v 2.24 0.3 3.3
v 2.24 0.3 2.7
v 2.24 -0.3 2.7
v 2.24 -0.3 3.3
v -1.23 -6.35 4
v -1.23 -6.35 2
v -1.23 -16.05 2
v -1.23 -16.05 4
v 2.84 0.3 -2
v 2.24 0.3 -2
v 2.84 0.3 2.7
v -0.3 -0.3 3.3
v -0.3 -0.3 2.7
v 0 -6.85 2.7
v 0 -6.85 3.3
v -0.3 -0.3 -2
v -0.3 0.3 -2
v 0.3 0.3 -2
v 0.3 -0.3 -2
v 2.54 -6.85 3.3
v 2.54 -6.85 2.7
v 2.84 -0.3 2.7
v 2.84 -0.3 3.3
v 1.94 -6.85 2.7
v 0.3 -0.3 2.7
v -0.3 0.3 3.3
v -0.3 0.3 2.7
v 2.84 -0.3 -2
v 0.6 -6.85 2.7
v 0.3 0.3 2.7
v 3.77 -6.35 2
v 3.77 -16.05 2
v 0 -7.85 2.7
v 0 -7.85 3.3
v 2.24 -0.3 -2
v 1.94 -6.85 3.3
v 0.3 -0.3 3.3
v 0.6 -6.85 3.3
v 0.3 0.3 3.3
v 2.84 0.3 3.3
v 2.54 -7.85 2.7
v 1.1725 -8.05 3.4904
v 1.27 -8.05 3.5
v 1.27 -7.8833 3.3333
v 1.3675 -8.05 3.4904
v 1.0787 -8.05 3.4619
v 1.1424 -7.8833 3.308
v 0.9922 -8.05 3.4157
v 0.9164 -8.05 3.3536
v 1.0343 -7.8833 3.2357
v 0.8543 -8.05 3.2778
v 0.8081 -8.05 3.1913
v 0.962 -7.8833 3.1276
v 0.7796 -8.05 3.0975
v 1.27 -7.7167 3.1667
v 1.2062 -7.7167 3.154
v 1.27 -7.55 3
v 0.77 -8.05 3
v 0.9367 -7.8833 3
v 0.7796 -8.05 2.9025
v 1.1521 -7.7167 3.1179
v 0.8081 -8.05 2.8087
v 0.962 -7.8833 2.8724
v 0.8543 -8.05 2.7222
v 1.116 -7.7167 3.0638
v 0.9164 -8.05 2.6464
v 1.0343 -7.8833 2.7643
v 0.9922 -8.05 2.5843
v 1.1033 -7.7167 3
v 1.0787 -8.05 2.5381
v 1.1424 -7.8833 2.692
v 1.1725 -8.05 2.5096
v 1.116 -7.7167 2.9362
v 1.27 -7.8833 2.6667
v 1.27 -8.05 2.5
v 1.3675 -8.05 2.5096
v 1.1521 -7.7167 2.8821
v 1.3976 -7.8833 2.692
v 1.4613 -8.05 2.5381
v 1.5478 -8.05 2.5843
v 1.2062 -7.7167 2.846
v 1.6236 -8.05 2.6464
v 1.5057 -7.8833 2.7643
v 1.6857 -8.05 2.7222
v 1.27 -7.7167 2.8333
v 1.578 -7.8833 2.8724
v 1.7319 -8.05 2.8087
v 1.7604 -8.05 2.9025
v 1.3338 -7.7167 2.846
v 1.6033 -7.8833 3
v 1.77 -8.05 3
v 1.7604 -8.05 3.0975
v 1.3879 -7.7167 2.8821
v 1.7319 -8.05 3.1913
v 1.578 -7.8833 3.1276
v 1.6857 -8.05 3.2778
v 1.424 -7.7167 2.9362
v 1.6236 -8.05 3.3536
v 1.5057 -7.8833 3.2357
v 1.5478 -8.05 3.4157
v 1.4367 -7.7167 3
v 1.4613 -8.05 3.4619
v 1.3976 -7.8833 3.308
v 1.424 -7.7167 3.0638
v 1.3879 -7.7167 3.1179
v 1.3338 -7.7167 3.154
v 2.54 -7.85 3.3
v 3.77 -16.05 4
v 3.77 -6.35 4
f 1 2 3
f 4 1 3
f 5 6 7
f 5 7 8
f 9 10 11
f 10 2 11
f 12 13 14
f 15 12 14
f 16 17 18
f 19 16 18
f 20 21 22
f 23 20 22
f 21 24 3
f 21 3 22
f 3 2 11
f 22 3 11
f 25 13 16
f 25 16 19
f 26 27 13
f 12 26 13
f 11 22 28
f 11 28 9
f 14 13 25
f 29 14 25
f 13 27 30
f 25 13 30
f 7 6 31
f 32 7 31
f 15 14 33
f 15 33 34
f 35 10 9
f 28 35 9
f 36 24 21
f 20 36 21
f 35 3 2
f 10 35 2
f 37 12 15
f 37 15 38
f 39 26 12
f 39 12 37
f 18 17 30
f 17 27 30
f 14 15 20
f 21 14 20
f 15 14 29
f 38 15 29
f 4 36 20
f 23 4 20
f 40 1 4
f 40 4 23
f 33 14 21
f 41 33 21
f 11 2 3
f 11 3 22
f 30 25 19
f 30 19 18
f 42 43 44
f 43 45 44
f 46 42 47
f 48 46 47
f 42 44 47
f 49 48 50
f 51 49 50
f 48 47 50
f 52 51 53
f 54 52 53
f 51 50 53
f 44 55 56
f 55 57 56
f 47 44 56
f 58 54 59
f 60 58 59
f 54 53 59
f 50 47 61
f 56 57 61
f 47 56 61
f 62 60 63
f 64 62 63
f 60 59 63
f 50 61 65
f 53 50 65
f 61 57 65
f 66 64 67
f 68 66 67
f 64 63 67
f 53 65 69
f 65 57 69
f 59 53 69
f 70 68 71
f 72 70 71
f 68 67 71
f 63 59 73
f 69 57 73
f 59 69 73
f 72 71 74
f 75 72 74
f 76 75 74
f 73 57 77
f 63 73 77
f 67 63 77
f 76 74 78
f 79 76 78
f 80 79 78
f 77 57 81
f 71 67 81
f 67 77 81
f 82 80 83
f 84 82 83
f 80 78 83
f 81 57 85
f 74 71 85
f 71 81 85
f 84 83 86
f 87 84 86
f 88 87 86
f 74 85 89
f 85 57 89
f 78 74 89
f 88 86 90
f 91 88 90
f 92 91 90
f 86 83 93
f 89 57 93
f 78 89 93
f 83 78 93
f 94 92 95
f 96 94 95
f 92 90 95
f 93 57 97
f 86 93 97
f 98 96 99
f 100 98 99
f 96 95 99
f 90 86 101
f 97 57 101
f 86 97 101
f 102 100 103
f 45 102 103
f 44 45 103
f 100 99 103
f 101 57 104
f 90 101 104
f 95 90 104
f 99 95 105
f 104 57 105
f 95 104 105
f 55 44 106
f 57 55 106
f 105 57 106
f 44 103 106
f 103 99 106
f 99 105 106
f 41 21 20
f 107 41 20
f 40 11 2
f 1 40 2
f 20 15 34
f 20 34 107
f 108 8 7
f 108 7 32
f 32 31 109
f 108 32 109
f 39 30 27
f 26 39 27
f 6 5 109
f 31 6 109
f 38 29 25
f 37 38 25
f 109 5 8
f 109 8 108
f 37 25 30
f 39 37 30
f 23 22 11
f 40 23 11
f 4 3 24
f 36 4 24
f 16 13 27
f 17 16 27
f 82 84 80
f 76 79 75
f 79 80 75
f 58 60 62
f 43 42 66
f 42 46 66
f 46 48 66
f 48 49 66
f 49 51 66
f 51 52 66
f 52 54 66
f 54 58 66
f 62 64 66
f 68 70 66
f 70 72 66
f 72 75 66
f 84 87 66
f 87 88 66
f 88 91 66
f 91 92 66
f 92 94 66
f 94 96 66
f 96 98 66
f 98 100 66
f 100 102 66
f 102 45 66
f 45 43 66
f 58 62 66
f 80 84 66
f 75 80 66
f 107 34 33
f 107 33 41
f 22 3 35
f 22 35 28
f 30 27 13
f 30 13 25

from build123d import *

# Parameters (mm, degrees)
SKETCH_W       = 0.6
SKETCH_H       = 0.6
PAD_DEPTH      = 2.7
PAD_DEPTH_BACK = 2
PAD001_DEPTH   = 0.6
SKETCH002_W    = 2.54
SKETCH002_H    = 0.6
PAD002_DEPTH   = 1
SKETCH004_W    = 5
SKETCH004_H    = 2
PAD003_DEPTH   = 9.7


with BuildPart() as pad:
    # Sketch → Pad (new body, two sides)
    with BuildSketch(Plane.XY) as pad_sk:
        Rectangle(SKETCH_W, SKETCH_H)
        with Locations((2.54, 0)):
            Rectangle(SKETCH_W, SKETCH_H)
    extrude(amount=PAD_DEPTH)
    extrude(pad_sk.sketch, amount=-PAD_DEPTH_BACK)


with BuildPart() as pad001:
    # Sketch001 → Pad001 (new body)
    with BuildSketch(Plane.XY.offset(2.7)):
        Polygon((0.3, 0.3), (-0.3, 0.3), (-0.3, -0.3), (0, -6.85), (0.6, -6.85), (0.3, -0.3), align=None)
        Polygon((2.84, 0.3), (2.24, 0.3), (2.24, -0.3), (1.94, -6.85), (2.54, -6.85), (2.84, -0.3), align=None)
    extrude(amount=PAD001_DEPTH)


with BuildPart() as pad002:
    # Sketch002 → Pad002 (new body)
    with BuildSketch(Plane.XZ.offset(6.85)):
        with Locations((1.27, 3)):
            Rectangle(SKETCH002_W, SKETCH002_H)
    extrude(amount=PAD002_DEPTH)


with BuildPart() as pad003:
    # Sketch004 → Pad003 (new body)
    with BuildSketch(Plane.XZ.offset(6.35)):
        with Locations((1.27, 3)):
            Rectangle(SKETCH004_W, SKETCH004_H)
    extrude(amount=PAD003_DEPTH)


with BuildPart() as revolution001:
    # Sketch005 → Revolution001 (revolve)
    with BuildSketch(Plane.YZ.offset(1.27)):
        Polygon((-7.55, 3), (-8.05, 3), (-8.05, 3.5), align=None)
    revolve(axis=Axis((1.27, -3.977201, 3), (0, -1, 0)))


solid = Compound([pad.part, pad001.part, pad002.part, pad003.part, revolution001.part])
